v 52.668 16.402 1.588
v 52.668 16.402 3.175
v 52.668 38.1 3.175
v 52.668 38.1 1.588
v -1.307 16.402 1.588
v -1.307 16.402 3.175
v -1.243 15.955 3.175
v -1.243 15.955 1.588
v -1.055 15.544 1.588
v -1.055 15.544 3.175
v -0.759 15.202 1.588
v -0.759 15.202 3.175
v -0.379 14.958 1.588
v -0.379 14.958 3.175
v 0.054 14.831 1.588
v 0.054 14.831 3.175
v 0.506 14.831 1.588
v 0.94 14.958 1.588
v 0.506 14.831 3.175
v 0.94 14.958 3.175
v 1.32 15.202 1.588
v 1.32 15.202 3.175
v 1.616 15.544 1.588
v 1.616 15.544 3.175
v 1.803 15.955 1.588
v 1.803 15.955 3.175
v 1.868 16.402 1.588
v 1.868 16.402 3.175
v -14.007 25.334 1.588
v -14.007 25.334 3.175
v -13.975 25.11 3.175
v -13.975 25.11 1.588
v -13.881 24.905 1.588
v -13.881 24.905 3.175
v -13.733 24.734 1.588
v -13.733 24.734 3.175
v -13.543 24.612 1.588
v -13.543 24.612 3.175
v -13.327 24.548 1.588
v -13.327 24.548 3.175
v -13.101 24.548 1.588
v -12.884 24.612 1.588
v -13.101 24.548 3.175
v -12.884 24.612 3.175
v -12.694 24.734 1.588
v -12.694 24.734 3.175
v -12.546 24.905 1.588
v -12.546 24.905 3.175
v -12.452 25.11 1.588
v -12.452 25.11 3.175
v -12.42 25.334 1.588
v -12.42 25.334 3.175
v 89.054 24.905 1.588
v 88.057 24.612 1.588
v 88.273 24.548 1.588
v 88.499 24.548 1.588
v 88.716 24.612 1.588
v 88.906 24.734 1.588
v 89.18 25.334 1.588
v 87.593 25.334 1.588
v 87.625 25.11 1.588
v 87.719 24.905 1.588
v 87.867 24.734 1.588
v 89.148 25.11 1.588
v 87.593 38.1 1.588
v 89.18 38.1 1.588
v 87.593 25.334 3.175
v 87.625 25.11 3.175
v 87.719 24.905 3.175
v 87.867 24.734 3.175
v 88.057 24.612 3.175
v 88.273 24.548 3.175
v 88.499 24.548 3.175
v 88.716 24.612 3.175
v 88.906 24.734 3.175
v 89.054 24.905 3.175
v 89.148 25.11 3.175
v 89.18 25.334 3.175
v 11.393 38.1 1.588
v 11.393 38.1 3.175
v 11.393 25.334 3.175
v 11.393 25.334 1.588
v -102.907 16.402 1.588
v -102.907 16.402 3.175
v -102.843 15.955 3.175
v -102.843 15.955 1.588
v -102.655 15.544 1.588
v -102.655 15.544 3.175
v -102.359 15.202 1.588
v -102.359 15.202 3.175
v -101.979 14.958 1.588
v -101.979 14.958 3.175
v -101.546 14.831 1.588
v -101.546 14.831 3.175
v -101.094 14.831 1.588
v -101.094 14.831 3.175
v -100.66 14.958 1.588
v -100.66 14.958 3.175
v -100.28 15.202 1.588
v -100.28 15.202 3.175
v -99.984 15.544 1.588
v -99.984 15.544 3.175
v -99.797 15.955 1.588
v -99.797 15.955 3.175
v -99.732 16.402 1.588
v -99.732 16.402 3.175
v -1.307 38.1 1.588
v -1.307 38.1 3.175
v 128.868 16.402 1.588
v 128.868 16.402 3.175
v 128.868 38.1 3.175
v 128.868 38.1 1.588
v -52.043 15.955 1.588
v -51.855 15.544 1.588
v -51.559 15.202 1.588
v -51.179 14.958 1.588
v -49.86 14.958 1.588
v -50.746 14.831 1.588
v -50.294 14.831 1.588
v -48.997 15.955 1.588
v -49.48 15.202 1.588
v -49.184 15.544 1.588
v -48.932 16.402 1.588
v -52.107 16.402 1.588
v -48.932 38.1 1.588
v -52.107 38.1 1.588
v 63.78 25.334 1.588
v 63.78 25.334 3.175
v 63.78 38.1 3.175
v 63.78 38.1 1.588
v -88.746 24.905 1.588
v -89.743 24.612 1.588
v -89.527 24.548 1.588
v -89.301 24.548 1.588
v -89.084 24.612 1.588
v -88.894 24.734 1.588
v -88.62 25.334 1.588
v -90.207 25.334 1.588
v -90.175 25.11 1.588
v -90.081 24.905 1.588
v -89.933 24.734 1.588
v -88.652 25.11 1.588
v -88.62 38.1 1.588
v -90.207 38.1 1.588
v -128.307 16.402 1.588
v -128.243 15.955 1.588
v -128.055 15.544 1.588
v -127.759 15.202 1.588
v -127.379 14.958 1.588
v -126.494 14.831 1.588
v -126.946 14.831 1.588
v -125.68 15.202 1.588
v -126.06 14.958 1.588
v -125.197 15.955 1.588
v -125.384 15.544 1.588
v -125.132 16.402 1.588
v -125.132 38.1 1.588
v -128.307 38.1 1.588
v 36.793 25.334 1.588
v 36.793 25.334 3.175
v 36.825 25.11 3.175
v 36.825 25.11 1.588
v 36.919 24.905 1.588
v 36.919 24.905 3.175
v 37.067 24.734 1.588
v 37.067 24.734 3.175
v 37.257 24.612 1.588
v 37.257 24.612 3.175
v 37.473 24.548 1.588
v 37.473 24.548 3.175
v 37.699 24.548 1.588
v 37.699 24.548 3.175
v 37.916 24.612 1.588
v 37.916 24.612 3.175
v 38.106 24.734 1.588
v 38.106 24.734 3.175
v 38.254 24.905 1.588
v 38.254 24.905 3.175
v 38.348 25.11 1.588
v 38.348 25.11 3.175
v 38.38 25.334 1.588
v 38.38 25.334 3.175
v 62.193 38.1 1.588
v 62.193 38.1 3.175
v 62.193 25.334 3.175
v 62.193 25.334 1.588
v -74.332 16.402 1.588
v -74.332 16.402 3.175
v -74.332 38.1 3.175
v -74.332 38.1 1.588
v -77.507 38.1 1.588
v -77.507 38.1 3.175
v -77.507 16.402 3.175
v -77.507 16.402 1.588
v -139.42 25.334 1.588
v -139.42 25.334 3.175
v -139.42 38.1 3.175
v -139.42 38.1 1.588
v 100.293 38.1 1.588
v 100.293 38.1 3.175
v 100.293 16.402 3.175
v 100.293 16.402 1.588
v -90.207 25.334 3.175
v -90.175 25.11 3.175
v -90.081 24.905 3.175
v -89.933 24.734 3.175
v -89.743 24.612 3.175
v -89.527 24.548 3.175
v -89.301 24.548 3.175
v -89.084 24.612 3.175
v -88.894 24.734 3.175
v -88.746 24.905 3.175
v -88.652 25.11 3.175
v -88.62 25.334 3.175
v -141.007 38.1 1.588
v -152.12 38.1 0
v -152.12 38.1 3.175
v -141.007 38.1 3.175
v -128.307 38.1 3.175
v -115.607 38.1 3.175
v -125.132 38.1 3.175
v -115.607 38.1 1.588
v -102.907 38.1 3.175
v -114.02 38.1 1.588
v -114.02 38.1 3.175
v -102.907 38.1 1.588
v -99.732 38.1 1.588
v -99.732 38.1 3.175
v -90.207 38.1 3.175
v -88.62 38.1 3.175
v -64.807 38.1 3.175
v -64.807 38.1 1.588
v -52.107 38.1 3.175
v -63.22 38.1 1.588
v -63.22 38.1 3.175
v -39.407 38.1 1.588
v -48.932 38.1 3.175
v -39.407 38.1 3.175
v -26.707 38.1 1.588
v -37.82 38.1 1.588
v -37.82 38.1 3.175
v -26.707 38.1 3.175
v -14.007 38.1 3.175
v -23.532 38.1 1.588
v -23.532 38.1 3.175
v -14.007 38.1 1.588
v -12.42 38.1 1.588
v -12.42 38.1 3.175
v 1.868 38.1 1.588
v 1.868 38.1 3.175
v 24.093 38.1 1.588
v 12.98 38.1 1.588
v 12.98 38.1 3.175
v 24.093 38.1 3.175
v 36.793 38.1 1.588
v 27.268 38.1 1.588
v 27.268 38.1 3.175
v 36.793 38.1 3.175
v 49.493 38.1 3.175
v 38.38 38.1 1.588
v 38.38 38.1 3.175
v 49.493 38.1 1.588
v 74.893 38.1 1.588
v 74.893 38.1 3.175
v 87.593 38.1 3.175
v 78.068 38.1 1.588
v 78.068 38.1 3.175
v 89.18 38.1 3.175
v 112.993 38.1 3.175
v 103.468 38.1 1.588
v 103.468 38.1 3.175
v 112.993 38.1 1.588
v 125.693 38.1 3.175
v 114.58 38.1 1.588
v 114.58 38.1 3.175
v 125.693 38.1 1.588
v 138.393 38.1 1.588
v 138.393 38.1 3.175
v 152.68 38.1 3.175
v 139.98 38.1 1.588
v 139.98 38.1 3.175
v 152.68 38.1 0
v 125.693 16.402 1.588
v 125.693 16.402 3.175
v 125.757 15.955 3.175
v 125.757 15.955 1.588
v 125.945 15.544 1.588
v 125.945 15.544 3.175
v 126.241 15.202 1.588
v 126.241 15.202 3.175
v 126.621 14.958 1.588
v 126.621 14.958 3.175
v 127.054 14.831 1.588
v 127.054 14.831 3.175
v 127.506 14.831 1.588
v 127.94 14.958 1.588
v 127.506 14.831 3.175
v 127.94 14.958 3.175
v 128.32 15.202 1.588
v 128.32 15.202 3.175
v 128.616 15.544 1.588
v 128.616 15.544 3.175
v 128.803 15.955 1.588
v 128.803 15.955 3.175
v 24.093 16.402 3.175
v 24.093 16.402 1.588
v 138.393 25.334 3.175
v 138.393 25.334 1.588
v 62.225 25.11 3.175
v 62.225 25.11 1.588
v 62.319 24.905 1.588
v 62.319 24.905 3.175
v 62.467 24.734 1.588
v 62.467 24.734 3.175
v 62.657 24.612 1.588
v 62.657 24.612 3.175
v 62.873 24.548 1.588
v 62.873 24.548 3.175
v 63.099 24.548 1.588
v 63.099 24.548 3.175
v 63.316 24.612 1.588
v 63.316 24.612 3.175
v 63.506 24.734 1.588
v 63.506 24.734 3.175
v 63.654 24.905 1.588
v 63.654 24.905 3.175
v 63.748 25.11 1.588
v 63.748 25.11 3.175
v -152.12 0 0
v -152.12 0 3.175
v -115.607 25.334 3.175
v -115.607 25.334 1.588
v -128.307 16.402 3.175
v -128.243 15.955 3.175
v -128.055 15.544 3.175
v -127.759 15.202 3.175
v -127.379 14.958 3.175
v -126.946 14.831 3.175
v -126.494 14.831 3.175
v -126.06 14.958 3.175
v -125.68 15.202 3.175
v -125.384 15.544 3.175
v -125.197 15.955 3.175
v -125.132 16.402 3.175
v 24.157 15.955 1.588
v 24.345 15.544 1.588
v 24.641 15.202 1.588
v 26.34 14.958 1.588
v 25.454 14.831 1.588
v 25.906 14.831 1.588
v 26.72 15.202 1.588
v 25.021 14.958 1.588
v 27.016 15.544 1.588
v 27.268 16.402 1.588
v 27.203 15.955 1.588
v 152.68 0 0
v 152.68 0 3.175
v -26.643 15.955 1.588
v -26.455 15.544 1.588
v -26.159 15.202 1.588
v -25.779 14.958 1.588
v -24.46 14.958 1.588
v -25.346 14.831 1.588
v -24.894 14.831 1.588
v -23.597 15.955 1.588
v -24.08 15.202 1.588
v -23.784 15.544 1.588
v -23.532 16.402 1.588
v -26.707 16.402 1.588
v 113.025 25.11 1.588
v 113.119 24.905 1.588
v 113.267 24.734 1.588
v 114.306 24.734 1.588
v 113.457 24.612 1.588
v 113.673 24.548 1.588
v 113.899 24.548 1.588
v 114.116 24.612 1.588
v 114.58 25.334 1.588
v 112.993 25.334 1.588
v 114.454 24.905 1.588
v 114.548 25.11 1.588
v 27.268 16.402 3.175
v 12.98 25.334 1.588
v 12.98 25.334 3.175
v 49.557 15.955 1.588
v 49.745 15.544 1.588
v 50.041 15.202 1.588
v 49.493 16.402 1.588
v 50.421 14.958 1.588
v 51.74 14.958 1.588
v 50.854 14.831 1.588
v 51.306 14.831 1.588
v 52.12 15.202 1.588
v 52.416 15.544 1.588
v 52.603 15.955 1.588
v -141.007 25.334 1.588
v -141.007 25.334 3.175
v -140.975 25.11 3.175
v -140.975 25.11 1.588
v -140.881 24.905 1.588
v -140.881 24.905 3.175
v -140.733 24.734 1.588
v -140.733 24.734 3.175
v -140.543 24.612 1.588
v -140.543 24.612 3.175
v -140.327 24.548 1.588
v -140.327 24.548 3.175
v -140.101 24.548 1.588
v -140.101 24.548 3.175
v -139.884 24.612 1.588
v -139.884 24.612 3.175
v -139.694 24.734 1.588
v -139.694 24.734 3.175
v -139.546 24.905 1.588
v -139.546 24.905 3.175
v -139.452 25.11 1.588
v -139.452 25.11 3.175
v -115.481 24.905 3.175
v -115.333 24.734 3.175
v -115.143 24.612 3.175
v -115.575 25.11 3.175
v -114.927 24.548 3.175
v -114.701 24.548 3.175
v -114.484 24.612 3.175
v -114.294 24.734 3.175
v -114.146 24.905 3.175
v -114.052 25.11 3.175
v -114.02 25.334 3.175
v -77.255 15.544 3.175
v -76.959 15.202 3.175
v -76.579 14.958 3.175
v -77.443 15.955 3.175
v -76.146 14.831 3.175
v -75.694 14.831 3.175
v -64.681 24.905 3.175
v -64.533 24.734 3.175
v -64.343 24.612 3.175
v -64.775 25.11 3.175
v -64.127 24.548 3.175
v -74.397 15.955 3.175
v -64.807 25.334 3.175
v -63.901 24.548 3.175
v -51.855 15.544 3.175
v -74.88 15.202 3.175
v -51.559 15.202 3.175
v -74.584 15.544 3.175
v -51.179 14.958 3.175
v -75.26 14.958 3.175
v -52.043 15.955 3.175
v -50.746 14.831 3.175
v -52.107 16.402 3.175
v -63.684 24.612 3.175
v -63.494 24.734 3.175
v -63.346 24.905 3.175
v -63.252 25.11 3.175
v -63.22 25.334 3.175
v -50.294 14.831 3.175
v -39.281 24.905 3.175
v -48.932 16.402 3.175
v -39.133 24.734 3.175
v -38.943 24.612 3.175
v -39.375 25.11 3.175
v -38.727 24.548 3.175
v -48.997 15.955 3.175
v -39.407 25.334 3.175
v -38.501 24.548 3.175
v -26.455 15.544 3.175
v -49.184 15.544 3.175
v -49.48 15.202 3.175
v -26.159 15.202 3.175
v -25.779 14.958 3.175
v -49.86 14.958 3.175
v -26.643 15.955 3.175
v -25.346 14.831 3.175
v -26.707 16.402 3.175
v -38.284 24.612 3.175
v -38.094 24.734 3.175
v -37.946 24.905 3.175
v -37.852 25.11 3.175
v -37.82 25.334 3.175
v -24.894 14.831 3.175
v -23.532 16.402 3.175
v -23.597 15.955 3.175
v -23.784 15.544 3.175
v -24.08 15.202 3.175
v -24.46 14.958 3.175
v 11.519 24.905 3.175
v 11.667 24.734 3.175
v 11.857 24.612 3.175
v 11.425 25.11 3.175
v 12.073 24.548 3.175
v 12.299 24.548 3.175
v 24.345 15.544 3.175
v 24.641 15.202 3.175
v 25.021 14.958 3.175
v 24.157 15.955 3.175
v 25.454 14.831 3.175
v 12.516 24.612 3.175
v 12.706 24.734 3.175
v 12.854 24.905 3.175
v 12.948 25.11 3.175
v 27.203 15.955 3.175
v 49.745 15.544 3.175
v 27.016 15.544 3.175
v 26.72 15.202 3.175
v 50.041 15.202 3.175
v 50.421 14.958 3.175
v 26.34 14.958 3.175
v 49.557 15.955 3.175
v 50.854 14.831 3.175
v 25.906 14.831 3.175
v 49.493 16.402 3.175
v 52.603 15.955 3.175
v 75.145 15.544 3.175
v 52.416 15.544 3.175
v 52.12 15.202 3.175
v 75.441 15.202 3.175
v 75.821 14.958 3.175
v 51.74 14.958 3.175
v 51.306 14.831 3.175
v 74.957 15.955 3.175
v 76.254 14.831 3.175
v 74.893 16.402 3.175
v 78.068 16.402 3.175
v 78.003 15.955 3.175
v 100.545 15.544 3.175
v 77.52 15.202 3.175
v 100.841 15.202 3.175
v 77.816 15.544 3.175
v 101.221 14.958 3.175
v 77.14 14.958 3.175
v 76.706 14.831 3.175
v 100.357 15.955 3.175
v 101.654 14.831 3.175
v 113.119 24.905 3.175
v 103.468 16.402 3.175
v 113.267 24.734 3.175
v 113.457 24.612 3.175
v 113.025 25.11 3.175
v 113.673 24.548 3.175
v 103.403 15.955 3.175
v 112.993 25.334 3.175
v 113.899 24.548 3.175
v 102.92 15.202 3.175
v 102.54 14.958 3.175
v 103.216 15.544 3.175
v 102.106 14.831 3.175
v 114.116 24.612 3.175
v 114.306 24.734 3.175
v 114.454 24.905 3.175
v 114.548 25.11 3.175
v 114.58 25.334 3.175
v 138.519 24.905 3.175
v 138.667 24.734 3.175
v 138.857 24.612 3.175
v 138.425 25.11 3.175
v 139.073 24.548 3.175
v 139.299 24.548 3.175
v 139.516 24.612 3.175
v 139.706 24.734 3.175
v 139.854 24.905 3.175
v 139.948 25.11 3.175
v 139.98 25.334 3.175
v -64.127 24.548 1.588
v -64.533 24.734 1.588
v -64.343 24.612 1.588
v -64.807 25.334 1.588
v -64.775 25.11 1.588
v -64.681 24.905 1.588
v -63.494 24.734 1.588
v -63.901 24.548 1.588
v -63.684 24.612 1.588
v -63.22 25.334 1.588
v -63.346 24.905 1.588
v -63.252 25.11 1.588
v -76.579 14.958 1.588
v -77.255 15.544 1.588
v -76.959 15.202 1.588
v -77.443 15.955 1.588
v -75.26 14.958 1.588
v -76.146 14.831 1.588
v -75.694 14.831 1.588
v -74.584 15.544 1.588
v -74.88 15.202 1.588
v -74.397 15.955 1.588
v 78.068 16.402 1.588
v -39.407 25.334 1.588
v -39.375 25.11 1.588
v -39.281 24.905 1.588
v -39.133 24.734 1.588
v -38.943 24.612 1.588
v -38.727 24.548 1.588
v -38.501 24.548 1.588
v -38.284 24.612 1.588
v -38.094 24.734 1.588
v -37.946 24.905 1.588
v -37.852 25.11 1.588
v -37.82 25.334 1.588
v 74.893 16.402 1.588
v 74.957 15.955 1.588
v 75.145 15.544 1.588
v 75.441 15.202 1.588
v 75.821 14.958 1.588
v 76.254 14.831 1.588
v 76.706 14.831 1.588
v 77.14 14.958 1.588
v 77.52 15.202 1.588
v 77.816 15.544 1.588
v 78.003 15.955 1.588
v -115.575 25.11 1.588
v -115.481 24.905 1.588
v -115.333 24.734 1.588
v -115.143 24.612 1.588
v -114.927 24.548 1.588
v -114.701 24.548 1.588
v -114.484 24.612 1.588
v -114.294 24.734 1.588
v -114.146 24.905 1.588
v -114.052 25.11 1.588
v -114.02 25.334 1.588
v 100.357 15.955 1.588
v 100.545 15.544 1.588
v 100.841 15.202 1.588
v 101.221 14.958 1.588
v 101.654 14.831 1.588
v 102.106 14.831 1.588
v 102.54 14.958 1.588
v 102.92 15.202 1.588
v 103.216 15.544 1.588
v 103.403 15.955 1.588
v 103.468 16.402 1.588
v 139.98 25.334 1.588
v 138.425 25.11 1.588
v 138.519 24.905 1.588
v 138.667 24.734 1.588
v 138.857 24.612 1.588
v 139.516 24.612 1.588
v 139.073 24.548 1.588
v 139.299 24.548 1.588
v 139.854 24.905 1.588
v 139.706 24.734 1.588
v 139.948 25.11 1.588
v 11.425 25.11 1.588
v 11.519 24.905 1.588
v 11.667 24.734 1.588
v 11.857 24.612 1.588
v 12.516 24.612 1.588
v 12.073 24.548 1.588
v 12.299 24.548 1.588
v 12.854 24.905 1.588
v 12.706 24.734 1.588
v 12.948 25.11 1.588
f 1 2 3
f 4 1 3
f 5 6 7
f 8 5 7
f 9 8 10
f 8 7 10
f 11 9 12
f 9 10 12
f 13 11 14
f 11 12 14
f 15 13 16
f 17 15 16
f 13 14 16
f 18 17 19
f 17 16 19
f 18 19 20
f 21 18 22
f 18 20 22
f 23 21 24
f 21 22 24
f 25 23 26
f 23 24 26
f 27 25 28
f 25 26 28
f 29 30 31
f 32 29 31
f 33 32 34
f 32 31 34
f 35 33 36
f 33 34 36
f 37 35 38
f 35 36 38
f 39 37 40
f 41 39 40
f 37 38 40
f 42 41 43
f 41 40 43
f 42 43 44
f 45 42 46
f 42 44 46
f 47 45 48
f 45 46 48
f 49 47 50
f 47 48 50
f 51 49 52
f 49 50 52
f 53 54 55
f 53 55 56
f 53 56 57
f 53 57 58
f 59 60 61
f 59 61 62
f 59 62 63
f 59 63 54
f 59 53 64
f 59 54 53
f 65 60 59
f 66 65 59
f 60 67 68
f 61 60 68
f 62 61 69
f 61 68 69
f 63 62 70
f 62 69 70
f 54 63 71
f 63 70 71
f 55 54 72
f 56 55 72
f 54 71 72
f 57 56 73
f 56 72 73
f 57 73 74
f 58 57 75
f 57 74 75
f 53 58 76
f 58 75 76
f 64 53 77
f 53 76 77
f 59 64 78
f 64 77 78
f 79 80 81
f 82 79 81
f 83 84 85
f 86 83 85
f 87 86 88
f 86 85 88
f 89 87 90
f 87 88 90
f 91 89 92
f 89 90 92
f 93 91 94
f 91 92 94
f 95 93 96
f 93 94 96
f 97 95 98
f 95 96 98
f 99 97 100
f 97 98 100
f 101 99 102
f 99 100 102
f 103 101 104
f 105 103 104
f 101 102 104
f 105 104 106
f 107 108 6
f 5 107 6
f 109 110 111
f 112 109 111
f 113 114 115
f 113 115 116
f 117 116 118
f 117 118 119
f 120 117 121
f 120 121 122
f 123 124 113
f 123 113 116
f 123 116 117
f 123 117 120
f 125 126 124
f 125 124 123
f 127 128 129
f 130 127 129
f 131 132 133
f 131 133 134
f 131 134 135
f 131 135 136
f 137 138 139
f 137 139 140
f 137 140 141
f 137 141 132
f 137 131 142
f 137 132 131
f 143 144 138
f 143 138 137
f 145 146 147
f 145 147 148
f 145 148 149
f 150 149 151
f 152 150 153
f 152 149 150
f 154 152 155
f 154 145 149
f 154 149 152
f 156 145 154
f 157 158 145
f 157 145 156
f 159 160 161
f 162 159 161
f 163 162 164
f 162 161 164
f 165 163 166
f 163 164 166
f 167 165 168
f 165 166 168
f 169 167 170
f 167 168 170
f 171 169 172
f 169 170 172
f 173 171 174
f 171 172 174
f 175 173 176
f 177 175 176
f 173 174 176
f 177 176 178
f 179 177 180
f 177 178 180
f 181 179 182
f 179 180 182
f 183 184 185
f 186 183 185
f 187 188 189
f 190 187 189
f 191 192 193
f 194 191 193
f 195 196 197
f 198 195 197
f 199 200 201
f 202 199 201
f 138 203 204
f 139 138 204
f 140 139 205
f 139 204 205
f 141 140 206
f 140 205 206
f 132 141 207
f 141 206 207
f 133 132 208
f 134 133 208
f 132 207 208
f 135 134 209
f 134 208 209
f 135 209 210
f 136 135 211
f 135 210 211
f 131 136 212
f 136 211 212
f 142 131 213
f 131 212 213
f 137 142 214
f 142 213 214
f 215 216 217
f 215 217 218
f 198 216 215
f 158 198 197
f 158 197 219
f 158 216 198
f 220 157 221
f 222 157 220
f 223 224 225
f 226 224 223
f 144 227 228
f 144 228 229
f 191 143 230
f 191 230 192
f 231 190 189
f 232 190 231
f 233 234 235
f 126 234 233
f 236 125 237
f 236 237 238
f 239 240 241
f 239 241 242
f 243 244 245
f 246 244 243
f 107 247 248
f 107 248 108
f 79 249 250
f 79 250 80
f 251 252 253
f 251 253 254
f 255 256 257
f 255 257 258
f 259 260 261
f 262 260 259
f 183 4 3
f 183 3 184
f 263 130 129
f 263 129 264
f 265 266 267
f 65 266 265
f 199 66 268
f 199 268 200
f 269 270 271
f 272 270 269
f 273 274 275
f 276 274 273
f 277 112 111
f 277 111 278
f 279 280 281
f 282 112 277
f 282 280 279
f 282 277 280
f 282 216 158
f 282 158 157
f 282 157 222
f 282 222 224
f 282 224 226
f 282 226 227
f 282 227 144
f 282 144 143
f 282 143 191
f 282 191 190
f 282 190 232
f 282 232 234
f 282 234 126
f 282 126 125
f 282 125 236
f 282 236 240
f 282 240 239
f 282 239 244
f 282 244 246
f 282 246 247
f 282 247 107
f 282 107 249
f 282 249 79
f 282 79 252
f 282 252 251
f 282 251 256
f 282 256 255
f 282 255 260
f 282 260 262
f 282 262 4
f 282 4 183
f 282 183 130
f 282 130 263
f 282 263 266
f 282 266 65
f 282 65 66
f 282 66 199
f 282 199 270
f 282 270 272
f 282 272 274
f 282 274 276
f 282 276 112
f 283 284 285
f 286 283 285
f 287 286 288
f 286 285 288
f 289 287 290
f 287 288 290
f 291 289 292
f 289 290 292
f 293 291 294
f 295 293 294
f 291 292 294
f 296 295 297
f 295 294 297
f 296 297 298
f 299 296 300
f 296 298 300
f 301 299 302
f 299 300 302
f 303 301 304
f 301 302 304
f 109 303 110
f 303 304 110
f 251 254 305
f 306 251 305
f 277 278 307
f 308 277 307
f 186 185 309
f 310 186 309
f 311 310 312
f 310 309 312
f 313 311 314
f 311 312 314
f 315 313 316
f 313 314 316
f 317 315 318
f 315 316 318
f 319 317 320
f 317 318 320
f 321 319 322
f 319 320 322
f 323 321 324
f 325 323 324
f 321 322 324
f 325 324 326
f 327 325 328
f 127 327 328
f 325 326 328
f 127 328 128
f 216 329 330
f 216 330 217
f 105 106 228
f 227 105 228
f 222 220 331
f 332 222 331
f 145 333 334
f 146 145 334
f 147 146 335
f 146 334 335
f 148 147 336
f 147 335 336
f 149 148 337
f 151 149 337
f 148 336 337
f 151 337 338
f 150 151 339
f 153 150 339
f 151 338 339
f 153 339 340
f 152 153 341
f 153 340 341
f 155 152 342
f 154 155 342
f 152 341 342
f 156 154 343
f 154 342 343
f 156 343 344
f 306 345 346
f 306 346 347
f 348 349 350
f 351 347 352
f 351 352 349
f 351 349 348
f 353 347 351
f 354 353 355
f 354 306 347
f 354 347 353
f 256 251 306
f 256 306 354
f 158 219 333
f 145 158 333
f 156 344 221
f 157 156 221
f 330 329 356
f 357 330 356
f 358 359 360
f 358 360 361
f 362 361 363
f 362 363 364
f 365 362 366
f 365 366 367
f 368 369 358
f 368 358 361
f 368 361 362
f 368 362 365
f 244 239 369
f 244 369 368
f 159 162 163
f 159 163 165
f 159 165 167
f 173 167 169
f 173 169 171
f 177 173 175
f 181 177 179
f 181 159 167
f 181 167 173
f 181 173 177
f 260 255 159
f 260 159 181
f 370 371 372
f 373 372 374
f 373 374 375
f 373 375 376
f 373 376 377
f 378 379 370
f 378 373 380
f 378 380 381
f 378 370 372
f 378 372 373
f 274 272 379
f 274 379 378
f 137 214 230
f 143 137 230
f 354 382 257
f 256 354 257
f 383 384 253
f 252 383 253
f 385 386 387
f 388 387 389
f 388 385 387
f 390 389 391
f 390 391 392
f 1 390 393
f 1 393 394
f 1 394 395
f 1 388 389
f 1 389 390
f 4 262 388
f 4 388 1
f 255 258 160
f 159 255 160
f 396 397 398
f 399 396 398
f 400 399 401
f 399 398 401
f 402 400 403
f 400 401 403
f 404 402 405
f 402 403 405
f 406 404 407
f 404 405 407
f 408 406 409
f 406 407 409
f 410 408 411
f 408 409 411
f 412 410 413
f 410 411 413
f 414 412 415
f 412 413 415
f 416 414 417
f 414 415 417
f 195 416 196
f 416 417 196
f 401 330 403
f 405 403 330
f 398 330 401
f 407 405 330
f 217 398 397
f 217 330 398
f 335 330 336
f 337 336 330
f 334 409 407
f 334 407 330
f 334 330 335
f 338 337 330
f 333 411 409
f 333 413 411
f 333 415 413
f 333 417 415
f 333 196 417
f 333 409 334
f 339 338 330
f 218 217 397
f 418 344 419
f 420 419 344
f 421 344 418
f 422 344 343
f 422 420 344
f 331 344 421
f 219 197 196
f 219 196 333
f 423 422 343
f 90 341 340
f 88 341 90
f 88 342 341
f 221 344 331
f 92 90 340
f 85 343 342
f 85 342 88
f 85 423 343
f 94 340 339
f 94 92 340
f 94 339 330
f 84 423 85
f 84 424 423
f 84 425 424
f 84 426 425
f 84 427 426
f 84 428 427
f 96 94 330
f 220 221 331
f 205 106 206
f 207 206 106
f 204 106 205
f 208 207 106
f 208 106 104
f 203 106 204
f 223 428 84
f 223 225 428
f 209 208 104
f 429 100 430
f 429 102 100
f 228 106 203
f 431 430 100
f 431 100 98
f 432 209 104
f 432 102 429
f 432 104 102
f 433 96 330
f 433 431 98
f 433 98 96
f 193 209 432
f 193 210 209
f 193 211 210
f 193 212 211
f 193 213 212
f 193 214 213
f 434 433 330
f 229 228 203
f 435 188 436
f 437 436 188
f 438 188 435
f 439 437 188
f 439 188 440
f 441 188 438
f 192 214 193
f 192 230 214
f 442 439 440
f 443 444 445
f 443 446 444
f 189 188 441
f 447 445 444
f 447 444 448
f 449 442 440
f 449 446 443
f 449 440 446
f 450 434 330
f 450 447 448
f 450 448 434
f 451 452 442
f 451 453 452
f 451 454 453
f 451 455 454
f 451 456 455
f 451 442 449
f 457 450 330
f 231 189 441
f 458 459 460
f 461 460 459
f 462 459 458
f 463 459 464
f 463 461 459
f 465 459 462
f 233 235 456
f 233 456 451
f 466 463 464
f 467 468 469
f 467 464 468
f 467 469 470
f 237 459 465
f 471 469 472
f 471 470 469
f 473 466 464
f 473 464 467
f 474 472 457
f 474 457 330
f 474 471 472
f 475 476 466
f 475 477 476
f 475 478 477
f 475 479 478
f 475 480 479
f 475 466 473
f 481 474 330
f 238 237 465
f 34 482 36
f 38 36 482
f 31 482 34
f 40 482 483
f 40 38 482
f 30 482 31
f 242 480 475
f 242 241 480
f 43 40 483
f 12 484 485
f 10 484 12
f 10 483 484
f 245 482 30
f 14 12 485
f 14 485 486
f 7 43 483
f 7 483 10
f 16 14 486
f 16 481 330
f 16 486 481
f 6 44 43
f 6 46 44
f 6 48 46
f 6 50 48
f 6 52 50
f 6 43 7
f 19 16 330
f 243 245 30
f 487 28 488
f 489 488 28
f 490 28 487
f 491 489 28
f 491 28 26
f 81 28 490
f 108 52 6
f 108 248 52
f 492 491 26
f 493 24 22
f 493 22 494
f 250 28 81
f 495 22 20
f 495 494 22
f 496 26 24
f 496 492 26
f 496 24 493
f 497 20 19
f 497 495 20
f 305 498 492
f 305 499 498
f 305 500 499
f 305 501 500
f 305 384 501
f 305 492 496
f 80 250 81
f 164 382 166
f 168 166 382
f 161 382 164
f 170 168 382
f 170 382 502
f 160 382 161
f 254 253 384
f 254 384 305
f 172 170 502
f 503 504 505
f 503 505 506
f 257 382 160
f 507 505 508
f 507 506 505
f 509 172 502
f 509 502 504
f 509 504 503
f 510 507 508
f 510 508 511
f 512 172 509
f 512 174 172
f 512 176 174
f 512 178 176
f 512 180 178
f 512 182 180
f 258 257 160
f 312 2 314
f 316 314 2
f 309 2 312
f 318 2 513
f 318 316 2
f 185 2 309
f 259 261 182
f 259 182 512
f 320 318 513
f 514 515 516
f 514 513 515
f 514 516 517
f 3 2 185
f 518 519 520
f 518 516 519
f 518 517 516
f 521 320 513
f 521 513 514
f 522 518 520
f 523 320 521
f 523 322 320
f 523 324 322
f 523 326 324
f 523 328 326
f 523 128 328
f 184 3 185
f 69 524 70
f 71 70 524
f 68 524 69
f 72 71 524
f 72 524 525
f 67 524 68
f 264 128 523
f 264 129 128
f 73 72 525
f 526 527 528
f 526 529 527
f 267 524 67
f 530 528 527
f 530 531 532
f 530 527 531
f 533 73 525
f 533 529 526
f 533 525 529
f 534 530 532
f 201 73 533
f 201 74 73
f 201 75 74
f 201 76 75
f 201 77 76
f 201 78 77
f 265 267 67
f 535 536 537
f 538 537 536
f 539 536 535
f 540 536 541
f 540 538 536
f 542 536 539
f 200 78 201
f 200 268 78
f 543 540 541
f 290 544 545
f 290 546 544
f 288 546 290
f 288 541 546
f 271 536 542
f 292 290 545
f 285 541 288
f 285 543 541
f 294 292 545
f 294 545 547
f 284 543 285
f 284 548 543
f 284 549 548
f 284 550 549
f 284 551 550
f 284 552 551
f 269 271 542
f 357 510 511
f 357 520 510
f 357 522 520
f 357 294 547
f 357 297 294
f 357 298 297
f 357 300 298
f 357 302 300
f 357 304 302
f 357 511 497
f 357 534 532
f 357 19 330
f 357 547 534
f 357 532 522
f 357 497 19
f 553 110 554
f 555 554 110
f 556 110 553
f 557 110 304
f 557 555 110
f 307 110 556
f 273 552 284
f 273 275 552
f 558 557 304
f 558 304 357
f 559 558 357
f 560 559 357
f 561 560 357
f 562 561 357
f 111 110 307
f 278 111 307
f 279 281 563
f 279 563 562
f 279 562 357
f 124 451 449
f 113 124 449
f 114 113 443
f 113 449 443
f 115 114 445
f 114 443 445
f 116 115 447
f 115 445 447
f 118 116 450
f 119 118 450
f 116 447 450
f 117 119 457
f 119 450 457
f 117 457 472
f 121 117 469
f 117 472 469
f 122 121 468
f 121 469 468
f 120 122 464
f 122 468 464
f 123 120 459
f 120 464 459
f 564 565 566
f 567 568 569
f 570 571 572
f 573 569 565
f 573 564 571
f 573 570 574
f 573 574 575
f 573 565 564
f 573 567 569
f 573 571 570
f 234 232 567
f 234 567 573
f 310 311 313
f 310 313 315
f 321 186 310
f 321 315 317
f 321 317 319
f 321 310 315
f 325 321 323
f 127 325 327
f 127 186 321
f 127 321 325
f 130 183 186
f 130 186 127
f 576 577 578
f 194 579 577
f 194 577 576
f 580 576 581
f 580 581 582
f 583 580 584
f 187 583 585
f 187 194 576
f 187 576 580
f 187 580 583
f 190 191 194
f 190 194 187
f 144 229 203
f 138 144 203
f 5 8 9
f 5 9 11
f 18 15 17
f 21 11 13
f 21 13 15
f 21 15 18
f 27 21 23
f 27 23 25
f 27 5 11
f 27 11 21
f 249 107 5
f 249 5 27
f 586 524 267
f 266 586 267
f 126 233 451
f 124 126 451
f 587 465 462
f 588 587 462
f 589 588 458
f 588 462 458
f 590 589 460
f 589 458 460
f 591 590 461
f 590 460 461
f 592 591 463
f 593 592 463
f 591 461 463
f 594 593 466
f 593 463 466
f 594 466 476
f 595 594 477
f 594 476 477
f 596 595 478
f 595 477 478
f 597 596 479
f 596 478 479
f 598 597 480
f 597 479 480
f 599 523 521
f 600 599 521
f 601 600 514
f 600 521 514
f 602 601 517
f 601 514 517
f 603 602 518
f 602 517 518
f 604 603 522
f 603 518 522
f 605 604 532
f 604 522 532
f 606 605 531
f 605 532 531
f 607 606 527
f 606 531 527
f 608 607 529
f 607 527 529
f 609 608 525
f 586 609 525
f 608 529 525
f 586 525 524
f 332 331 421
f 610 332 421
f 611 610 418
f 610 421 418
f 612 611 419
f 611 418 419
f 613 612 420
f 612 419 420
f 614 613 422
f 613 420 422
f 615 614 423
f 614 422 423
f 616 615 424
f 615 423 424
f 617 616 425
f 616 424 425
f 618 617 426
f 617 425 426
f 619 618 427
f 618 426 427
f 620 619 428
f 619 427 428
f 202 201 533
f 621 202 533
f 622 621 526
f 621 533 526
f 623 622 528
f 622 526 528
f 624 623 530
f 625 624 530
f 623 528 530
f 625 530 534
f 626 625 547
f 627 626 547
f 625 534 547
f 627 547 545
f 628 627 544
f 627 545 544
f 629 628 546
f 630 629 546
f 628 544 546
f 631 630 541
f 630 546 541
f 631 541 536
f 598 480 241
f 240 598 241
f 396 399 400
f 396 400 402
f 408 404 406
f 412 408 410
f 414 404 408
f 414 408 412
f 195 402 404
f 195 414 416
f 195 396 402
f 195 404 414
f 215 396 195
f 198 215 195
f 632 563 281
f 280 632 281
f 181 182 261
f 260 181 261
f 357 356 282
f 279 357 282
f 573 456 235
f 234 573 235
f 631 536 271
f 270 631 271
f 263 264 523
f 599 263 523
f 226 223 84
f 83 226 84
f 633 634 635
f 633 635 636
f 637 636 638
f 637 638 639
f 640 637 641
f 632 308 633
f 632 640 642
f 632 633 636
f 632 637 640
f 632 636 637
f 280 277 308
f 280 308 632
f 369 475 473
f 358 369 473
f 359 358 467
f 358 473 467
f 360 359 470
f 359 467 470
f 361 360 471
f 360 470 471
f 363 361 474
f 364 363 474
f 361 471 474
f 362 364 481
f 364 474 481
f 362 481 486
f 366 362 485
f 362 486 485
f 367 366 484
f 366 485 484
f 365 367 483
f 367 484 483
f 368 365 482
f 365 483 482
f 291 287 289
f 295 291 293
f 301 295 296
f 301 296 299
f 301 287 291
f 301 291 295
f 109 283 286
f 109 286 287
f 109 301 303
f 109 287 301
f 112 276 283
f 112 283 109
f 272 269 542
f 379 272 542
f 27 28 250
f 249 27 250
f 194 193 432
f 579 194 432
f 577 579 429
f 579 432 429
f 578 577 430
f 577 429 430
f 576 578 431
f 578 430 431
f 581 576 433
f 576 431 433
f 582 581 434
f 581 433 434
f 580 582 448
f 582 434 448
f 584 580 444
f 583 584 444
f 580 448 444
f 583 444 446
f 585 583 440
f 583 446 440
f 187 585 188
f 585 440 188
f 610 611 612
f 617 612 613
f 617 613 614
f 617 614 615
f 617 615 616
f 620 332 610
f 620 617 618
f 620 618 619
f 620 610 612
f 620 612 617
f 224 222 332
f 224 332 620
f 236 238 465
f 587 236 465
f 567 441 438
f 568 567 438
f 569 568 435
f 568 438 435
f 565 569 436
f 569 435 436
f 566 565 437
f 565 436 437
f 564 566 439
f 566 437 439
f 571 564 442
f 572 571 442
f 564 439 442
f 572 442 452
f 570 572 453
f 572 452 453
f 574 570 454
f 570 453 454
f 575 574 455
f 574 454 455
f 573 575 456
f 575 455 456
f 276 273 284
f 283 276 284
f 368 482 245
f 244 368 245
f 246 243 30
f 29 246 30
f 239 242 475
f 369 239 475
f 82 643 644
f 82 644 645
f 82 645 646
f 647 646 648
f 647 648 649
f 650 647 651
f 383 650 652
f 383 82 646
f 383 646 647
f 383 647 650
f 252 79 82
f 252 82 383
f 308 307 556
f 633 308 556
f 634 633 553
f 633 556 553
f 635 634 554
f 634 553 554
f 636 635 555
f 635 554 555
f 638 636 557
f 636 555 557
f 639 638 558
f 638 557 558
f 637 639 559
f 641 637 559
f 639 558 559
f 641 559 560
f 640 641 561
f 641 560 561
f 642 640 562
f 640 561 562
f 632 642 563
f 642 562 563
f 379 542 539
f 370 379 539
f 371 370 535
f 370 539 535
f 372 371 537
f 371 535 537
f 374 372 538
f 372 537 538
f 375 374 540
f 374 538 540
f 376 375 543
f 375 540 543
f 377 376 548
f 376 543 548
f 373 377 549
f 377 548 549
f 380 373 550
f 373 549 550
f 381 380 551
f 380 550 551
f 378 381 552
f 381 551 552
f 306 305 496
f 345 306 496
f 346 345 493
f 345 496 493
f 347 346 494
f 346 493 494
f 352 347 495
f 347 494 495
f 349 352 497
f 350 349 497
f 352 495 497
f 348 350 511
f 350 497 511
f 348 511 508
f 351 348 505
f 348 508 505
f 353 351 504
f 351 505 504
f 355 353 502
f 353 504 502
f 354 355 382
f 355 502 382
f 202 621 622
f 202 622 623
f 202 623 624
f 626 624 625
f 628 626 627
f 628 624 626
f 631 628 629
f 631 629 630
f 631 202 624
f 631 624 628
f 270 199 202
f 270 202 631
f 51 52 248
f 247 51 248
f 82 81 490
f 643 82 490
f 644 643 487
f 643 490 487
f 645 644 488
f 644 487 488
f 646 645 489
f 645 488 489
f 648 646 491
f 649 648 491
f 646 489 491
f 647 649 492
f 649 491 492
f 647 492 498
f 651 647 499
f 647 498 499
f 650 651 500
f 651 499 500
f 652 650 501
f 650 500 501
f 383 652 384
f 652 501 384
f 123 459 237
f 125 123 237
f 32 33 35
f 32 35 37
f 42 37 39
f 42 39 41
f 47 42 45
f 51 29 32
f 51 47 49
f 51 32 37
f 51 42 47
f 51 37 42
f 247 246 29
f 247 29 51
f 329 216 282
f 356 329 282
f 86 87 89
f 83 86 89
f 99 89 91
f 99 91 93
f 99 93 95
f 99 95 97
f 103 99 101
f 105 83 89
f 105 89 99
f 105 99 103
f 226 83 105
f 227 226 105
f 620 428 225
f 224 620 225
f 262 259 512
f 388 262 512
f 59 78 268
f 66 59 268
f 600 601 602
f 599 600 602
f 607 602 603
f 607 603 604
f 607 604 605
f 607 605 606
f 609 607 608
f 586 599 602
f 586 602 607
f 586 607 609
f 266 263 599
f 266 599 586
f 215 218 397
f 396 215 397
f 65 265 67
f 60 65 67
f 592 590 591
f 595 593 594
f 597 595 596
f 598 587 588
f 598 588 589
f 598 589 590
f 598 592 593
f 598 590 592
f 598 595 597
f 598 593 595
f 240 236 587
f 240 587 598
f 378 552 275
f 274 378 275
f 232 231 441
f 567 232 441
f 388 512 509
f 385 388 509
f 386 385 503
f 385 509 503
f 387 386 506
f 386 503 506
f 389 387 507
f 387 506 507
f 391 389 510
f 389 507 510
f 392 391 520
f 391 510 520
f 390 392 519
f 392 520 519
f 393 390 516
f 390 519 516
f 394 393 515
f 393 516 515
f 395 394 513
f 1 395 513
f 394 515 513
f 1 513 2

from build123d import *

# Parameters (mm, degrees)
F0_W     = 304.8
F0_H     = 38.1
F1_DEPTH = 3.175
F3_DEPTH = 1.5875
F5_DEPTH = 1.5875


with BuildPart() as f1:
    # F0 (on Top) → F1 (new body)
    with BuildSketch(Plane.XY):
        with Locations((0.280146, 19.05)):
            Rectangle(F0_W, F0_H)
    extrude(amount=F1_DEPTH)

    # F2 (on face) → F3 (cut)
    with BuildSketch(Plane.XY.offset(3.175)):
        with BuildLine():
            Line((-126.719854, 38.1), (-128.307354, 38.1))
            Line((-128.307354, 38.1), (-128.307354, 16.401879))
            ThreePointArc((-128.307354, 16.401879), (-126.719854, 14.814379), (-125.132354, 16.401879))
            Line((-125.132354, 16.401879), (-125.132354, 38.1))
            Line((-125.132354, 38.1), (-126.719854, 38.1))
        make_face()
        with BuildLine():
            Line((-101.319854, 38.1), (-102.907354, 38.1))
            Line((-102.907354, 38.1), (-102.907354, 16.401879))
            ThreePointArc((-102.907354, 16.401879), (-101.319854, 14.814379), (-99.732354, 16.401879))
            Line((-99.732354, 16.401879), (-99.732354, 38.1))
            Line((-99.732354, 38.1), (-101.319854, 38.1))
        make_face()
        with BuildLine():
            Line((-75.919854, 38.1), (-77.507354, 38.1))
            Line((-77.507354, 38.1), (-77.507354, 16.401879))
            ThreePointArc((-77.507354, 16.401879), (-75.919854, 14.814379), (-74.332354, 16.401879))
            Line((-74.332354, 16.401879), (-74.332354, 38.1))
            Line((-74.332354, 38.1), (-75.919854, 38.1))
        make_face()
        with BuildLine():
            Line((-50.519854, 38.1), (-52.107354, 38.1))
            Line((-52.107354, 38.1), (-52.107354, 16.401879))
            ThreePointArc((-52.107354, 16.401879), (-50.519854, 14.814379), (-48.932354, 16.401879))
            Line((-48.932354, 16.401879), (-48.932354, 38.1))
            Line((-48.932354, 38.1), (-50.519854, 38.1))
        make_face()
        with BuildLine():
            Line((-25.119854, 38.1), (-26.707354, 38.1))
            Line((-26.707354, 38.1), (-26.707354, 16.401879))
            ThreePointArc((-26.707354, 16.401879), (-25.119854, 14.814379), (-23.532354, 16.401879))
            Line((-23.532354, 16.401879), (-23.532354, 38.1))
            Line((-23.532354, 38.1), (-25.119854, 38.1))
        make_face()
        with BuildLine():
            Line((1.867646, 16.401879), (1.867646, 38.1))
            Line((1.867646, 38.1), (0.280146, 38.1))
            Line((0.280146, 38.1), (-1.307354, 38.1))
            Line((-1.307354, 38.1), (-1.307354, 16.401879))
            ThreePointArc((-1.307354, 16.401879), (0.280146, 14.814379), (1.867646, 16.401879))
        make_face()
        with BuildLine():
            Line((27.267646, 16.401879), (27.267646, 38.1))
            Line((27.267646, 38.1), (25.680146, 38.1))
            Line((25.680146, 38.1), (24.092646, 38.1))
            Line((24.092646, 38.1), (24.092646, 16.401879))
            ThreePointArc((24.092646, 16.401879), (25.680146, 14.814379), (27.267646, 16.401879))
        make_face()
        with BuildLine():
            Line((52.667646, 16.401879), (52.667646, 38.1))
            Line((52.667646, 38.1), (51.080146, 38.1))
            Line((51.080146, 38.1), (49.492646, 38.1))
            Line((49.492646, 38.1), (49.492646, 16.401879))
            ThreePointArc((49.492646, 16.401879), (51.080146, 14.814379), (52.667646, 16.401879))
        make_face()
        with BuildLine():
            Line((78.067646, 16.401879), (78.067646, 38.1))
            Line((78.067646, 38.1), (76.480146, 38.1))
            Line((76.480146, 38.1), (74.892646, 38.1))
            Line((74.892646, 38.1), (74.892646, 16.401879))
            ThreePointArc((74.892646, 16.401879), (76.480146, 14.814379), (78.067646, 16.401879))
        make_face()
        with BuildLine():
            Line((103.467646, 16.401879), (103.467646, 38.1))
            Line((103.467646, 38.1), (101.880146, 38.1))
            Line((101.880146, 38.1), (100.292646, 38.1))
            Line((100.292646, 38.1), (100.292646, 16.401879))
            ThreePointArc((100.292646, 16.401879), (101.880146, 14.814379), (103.467646, 16.401879))
        make_face()
        with BuildLine():
            Line((128.867646, 16.401879), (128.867646, 38.1))
            Line((128.867646, 38.1), (127.280146, 38.1))
            Line((127.280146, 38.1), (125.692646, 38.1))
            Line((125.692646, 38.1), (125.692646, 16.401879))
            ThreePointArc((125.692646, 16.401879), (127.280146, 14.814379), (128.867646, 16.401879))
        make_face()
    extrude(amount=-F3_DEPTH, mode=Mode.SUBTRACT)

    # F4 (on face) → F5 (cut)
    with BuildSketch(Plane.XY.offset(3.175)):
        with BuildLine():
            ThreePointArc((-139.419854, 38.1), (-140.213604, 38.89375), (-141.007354, 38.1))
            Line((-141.007354, 38.1), (-141.007354, 25.334114))
            ThreePointArc((-141.007354, 25.334114), (-140.213604, 24.540364), (-139.419854, 25.334114))
            Line((-139.419854, 25.334114), (-139.419854, 38.1))
        make_face()
        with BuildLine():
            ThreePointArc((-114.019854, 38.1), (-114.813604, 38.89375), (-115.607354, 38.1))
            Line((-115.607354, 38.1), (-115.607354, 25.334114))
            ThreePointArc((-115.607354, 25.334114), (-114.813604, 24.540364), (-114.019854, 25.334114))
            Line((-114.019854, 25.334114), (-114.019854, 38.1))
        make_face()
        with BuildLine():
            ThreePointArc((-88.619854, 38.1), (-89.413604, 38.89375), (-90.207354, 38.1))
            Line((-90.207354, 38.1), (-90.207354, 25.334114))
            ThreePointArc((-90.207354, 25.334114), (-89.413604, 24.540364), (-88.619854, 25.334114))
            Line((-88.619854, 25.334114), (-88.619854, 38.1))
        make_face()
        with BuildLine():
            ThreePointArc((-63.219854, 38.1), (-64.013604, 38.89375), (-64.807354, 38.1))
            Line((-64.807354, 38.1), (-64.807354, 25.334114))
            ThreePointArc((-64.807354, 25.334114), (-64.013604, 24.540364), (-63.219854, 25.334114))
            Line((-63.219854, 25.334114), (-63.219854, 38.1))
        make_face()
        with BuildLine():
            ThreePointArc((-37.819854, 38.1), (-38.613604, 38.89375), (-39.407354, 38.1))
            Line((-39.407354, 38.1), (-39.407354, 25.334114))
            ThreePointArc((-39.407354, 25.334114), (-38.613604, 24.540364), (-37.819854, 25.334114))
            Line((-37.819854, 25.334114), (-37.819854, 38.1))
        make_face()
        with BuildLine():
            ThreePointArc((-12.419854, 38.1), (-13.213604, 38.89375), (-14.007354, 38.1))
            Line((-14.007354, 38.1), (-14.007354, 25.334114))
            ThreePointArc((-14.007354, 25.334114), (-13.213604, 24.540364), (-12.419854, 25.334114))
            Line((-12.419854, 25.334114), (-12.419854, 38.1))
        make_face()
        with BuildLine():
            ThreePointArc((12.980146, 38.1), (12.186396, 38.89375), (11.392646, 38.1))
            Line((11.392646, 38.1), (11.392646, 25.334114))
            ThreePointArc((11.392646, 25.334114), (12.186396, 24.540364), (12.980146, 25.334114))
            Line((12.980146, 25.334114), (12.980146, 38.1))
        make_face()
        with BuildLine():
            ThreePointArc((38.380146, 38.1), (37.586396, 38.89375), (36.792646, 38.1))
            Line((36.792646, 38.1), (36.792646, 25.334114))
            ThreePointArc((36.792646, 25.334114), (37.586396, 24.540364), (38.380146, 25.334114))
            Line((38.380146, 25.334114), (38.380146, 38.1))
        make_face()
        with BuildLine():
            ThreePointArc((63.780146, 38.1), (62.986396, 38.89375), (62.192646, 38.1))
            Line((62.192646, 38.1), (62.192646, 25.334114))
            ThreePointArc((62.192646, 25.334114), (62.986396, 24.540364), (63.780146, 25.334114))
            Line((63.780146, 25.334114), (63.780146, 38.1))
        make_face()
        with BuildLine():
            ThreePointArc((89.180146, 38.1), (88.386396, 38.89375), (87.592646, 38.1))
            Line((87.592646, 38.1), (87.592646, 25.334114))
            ThreePointArc((87.592646, 25.334114), (88.386396, 24.540364), (89.180146, 25.334114))
            Line((89.180146, 25.334114), (89.180146, 38.1))
        make_face()
        with BuildLine():
            ThreePointArc((114.580146, 38.1), (113.786396, 38.89375), (112.992646, 38.1))
            Line((112.992646, 38.1), (112.992646, 25.334114))
            ThreePointArc((112.992646, 25.334114), (113.786396, 24.540364), (114.580146, 25.334114))
            Line((114.580146, 25.334114), (114.580146, 38.1))
        make_face()
        with BuildLine():
            ThreePointArc((139.980146, 38.1), (139.186396, 38.89375), (138.392646, 38.1))
            Line((138.392646, 38.1), (138.392646, 25.334114))
            ThreePointArc((138.392646, 25.334114), (139.186396, 24.540364), (139.980146, 25.334114))
            Line((139.980146, 25.334114), (139.980146, 38.1))
        make_face()
    extrude(amount=-F5_DEPTH, mode=Mode.SUBTRACT)


solid = f1.part
